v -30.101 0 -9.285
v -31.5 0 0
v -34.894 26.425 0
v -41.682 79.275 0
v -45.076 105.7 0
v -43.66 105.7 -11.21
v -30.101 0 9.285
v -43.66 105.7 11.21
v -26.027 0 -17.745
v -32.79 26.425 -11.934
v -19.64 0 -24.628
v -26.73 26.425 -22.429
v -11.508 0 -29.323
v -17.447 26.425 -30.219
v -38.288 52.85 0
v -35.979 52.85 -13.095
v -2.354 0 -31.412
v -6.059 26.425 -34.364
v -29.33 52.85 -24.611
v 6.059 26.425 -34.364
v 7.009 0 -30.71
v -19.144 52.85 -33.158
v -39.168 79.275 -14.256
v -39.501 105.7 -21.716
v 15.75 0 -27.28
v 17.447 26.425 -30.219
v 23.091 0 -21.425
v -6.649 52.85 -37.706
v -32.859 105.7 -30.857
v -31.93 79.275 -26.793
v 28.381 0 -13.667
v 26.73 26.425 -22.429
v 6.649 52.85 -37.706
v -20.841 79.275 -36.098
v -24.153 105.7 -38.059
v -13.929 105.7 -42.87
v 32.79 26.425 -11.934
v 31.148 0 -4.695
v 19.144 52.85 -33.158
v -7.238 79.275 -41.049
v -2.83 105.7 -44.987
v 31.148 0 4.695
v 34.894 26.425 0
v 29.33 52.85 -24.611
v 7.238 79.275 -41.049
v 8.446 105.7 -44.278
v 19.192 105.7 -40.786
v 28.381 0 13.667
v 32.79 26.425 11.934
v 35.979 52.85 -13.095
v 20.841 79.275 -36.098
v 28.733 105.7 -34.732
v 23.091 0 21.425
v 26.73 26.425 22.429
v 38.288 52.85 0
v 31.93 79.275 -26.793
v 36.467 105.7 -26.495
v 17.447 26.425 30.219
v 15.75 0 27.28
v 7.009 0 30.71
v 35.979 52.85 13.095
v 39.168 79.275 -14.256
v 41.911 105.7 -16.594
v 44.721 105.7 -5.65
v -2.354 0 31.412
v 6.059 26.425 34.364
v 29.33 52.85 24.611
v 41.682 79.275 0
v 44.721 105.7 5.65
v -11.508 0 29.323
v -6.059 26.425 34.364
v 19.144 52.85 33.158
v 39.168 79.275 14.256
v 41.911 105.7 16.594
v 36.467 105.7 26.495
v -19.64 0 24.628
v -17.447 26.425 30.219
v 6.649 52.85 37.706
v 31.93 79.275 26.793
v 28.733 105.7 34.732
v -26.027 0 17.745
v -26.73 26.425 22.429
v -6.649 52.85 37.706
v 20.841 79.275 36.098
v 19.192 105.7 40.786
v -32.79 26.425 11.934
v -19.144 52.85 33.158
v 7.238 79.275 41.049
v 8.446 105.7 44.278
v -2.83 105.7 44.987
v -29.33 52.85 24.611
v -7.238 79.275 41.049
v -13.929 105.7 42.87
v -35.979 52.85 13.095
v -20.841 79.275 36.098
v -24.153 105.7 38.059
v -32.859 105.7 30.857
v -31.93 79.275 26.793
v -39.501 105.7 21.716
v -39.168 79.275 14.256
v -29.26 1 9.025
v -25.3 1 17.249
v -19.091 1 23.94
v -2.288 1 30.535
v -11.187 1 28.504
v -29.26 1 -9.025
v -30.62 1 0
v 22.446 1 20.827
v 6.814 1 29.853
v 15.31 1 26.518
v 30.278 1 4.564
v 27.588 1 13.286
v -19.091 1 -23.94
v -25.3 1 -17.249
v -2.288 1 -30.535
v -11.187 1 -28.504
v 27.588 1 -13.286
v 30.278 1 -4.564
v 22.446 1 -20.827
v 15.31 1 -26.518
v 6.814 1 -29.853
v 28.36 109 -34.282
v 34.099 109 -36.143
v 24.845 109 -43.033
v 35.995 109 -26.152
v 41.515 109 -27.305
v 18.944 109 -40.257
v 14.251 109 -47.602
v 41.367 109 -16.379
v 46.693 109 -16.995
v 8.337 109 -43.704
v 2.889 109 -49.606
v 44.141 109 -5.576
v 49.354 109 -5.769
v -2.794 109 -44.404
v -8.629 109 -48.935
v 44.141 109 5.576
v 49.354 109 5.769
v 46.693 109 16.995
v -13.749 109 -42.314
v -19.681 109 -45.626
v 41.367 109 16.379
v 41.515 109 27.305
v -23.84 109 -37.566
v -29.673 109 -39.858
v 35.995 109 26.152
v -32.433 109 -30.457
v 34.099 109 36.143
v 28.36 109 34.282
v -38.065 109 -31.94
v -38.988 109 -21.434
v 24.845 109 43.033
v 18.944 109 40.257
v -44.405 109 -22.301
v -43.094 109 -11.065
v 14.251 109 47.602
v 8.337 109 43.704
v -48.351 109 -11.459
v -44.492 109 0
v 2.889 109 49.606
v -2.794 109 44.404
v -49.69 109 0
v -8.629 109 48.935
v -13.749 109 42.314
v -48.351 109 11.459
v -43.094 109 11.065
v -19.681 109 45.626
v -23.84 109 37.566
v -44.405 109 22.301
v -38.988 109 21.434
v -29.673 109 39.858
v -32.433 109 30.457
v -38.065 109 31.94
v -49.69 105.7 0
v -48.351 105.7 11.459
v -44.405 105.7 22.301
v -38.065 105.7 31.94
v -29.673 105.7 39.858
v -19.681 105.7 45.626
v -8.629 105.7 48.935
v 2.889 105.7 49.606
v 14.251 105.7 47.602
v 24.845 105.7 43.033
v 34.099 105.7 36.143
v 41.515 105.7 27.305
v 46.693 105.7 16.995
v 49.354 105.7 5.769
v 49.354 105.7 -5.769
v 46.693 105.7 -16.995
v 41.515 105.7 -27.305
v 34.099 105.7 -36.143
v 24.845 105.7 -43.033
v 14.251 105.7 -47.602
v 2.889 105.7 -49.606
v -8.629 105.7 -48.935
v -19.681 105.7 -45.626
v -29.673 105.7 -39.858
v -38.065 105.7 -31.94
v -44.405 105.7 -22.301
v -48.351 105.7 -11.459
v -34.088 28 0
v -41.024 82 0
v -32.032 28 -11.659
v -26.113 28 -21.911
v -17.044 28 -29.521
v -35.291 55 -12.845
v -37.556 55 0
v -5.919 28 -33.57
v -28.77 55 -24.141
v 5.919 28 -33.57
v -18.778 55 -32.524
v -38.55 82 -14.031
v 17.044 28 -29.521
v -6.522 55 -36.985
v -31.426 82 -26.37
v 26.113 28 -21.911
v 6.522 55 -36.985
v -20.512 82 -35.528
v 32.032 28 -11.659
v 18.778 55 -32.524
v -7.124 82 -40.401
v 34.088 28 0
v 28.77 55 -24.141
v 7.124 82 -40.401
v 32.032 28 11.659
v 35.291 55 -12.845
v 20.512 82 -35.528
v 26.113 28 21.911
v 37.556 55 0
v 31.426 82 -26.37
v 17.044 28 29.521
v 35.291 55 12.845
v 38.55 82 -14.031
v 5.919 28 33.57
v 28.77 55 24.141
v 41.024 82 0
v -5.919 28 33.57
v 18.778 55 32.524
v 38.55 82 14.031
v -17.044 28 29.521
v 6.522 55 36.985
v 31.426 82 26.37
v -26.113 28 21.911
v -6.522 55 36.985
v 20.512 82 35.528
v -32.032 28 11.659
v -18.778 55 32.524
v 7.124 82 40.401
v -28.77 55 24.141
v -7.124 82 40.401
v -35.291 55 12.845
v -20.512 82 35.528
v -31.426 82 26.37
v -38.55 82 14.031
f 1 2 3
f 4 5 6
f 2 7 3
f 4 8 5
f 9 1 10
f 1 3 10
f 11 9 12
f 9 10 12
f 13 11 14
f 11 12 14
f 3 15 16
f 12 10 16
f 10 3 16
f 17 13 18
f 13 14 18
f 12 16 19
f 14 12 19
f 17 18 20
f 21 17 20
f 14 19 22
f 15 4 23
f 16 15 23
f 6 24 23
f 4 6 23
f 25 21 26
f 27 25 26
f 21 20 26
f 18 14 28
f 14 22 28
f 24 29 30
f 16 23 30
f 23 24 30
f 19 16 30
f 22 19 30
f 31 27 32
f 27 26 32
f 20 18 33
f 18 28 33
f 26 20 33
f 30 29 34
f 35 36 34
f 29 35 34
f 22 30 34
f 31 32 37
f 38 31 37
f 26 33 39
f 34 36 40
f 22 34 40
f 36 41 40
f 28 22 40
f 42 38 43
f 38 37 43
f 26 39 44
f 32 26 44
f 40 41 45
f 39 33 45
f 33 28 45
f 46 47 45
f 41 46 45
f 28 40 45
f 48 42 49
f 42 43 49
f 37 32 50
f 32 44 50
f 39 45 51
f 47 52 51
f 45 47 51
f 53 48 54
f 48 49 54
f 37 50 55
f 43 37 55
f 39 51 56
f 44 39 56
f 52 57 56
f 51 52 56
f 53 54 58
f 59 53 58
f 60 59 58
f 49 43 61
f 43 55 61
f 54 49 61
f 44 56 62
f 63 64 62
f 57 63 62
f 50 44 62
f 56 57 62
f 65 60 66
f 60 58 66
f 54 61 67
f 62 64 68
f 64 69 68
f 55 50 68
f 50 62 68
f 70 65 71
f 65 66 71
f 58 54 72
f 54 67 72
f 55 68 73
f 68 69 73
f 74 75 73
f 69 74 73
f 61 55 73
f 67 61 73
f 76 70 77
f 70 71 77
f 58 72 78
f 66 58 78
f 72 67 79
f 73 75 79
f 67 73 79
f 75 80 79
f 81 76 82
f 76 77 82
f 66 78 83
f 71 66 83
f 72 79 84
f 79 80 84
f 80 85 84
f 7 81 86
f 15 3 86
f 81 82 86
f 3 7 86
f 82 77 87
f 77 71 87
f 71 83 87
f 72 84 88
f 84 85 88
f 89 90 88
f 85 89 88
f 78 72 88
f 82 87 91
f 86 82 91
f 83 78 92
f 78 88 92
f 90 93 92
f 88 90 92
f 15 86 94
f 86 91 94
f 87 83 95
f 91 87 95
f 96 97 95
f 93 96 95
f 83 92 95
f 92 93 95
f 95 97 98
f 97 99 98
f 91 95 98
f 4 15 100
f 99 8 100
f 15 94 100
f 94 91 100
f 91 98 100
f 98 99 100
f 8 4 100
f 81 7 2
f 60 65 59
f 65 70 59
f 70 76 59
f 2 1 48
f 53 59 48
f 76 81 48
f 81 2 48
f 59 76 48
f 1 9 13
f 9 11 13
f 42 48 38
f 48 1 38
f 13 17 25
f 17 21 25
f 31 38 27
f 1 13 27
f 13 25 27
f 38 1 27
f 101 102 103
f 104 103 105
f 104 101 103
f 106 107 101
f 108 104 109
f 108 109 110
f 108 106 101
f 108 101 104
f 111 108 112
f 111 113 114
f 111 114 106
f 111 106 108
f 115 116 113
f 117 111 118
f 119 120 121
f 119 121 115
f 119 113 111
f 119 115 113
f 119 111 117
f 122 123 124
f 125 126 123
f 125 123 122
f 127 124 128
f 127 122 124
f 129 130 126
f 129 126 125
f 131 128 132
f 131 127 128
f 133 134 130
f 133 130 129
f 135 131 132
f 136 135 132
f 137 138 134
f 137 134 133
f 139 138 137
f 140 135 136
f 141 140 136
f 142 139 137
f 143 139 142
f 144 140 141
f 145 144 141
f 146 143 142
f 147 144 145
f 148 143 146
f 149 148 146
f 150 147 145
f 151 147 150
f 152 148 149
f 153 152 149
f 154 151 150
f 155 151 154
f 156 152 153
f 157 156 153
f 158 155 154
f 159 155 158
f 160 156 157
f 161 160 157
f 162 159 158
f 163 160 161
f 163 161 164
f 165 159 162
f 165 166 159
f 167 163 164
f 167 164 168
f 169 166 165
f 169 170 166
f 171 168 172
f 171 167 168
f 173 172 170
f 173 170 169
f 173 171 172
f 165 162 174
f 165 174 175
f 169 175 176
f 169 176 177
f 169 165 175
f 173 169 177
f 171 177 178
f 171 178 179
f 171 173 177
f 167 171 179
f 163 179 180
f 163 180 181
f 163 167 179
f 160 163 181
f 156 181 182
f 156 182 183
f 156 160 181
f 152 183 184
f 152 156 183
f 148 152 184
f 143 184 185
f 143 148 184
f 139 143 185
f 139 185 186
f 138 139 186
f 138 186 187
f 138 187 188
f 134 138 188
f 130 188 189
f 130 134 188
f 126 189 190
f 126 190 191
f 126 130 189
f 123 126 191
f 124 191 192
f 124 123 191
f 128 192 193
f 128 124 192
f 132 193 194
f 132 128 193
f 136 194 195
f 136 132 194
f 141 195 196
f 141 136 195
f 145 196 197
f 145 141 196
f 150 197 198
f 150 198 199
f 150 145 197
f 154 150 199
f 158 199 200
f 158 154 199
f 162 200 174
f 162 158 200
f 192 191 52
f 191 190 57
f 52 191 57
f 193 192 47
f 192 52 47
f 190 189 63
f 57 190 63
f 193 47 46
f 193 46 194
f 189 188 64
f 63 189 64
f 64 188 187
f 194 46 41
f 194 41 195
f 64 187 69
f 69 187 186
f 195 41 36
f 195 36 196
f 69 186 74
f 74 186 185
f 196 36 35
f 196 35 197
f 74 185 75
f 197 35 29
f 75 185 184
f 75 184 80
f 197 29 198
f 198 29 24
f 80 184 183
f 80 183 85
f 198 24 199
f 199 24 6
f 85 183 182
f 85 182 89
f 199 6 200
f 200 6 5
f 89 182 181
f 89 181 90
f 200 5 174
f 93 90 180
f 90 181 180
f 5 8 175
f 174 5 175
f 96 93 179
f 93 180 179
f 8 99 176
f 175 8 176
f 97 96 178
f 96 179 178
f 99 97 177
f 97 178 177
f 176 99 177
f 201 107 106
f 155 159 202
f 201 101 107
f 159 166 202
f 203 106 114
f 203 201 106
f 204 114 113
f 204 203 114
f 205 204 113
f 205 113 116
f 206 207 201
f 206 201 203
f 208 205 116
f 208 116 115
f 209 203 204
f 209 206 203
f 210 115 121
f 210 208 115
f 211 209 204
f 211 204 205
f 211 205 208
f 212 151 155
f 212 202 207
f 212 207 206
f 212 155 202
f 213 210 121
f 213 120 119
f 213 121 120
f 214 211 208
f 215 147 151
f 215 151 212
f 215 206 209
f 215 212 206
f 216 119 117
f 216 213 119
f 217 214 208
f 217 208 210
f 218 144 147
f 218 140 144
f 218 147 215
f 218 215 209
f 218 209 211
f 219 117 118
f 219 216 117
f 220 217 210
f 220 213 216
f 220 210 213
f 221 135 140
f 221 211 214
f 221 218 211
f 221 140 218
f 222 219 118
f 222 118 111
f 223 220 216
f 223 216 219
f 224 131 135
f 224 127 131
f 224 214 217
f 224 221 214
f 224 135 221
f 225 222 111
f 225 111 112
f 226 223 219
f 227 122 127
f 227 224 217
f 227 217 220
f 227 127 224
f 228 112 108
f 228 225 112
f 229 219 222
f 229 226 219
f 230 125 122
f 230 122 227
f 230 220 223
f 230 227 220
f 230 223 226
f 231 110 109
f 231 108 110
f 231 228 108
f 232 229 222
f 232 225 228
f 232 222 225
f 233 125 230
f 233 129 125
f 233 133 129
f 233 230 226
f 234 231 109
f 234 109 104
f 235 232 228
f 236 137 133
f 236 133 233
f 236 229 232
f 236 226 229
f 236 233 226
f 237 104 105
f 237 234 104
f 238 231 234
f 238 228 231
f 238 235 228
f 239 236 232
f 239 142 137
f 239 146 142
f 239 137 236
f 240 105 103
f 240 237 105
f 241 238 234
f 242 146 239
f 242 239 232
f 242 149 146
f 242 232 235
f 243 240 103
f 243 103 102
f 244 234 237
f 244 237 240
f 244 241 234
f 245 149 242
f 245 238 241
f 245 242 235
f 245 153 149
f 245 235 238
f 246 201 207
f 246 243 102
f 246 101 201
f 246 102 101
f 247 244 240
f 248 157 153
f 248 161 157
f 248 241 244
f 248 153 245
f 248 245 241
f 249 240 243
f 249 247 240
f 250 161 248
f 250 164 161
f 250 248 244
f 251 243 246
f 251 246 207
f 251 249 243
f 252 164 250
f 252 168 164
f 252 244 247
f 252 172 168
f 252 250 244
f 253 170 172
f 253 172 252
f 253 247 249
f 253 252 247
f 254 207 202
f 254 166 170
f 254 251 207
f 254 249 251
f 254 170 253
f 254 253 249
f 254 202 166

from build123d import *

# Parameters (mm, degrees)
COQUE1_T           = -1
ESQUISSE2_R        = 49.69
ESQUISSE2_R_2      = 44.491785277
BOSS_EXTRU_1_DEPTH = 3.3


with BuildPart() as part:
    # Esquisse1 → Révolution1 (revolve)
    with BuildSketch(Plane.XY, mode=Mode.PRIVATE) as r_volution1_sk:
        Polygon((0, 0), (31.5, 0), (45.5, 109), (0, 109), align=None)
    revolve(r_volution1_sk.sketch.rotate(Axis((0, 109, 0), (0, -1, 0)), 180), axis=Axis((0, 109, 0), (0, -1, 0)))

    # Coque1
    coque1_openings = [part.faces().sort_by_distance(p)[0] for p in [
        (0, 109, 0),
    ]]
    offset(amount=COQUE1_T, openings=coque1_openings, kind=Kind.INTERSECTION)

    # Esquisse2 → Boss.-Extru.1 (add)
    with BuildSketch(Plane(origin=(0, 109, 0), x_dir=(1, 0, 0), z_dir=(0, 1, 0))):
        with Locations(Location((0, 0, 0), (0, 0, 180))):
            Circle(ESQUISSE2_R)
        Circle(ESQUISSE2_R_2, mode=Mode.SUBTRACT)
    extrude(amount=-BOSS_EXTRU_1_DEPTH)


solid = part.part
